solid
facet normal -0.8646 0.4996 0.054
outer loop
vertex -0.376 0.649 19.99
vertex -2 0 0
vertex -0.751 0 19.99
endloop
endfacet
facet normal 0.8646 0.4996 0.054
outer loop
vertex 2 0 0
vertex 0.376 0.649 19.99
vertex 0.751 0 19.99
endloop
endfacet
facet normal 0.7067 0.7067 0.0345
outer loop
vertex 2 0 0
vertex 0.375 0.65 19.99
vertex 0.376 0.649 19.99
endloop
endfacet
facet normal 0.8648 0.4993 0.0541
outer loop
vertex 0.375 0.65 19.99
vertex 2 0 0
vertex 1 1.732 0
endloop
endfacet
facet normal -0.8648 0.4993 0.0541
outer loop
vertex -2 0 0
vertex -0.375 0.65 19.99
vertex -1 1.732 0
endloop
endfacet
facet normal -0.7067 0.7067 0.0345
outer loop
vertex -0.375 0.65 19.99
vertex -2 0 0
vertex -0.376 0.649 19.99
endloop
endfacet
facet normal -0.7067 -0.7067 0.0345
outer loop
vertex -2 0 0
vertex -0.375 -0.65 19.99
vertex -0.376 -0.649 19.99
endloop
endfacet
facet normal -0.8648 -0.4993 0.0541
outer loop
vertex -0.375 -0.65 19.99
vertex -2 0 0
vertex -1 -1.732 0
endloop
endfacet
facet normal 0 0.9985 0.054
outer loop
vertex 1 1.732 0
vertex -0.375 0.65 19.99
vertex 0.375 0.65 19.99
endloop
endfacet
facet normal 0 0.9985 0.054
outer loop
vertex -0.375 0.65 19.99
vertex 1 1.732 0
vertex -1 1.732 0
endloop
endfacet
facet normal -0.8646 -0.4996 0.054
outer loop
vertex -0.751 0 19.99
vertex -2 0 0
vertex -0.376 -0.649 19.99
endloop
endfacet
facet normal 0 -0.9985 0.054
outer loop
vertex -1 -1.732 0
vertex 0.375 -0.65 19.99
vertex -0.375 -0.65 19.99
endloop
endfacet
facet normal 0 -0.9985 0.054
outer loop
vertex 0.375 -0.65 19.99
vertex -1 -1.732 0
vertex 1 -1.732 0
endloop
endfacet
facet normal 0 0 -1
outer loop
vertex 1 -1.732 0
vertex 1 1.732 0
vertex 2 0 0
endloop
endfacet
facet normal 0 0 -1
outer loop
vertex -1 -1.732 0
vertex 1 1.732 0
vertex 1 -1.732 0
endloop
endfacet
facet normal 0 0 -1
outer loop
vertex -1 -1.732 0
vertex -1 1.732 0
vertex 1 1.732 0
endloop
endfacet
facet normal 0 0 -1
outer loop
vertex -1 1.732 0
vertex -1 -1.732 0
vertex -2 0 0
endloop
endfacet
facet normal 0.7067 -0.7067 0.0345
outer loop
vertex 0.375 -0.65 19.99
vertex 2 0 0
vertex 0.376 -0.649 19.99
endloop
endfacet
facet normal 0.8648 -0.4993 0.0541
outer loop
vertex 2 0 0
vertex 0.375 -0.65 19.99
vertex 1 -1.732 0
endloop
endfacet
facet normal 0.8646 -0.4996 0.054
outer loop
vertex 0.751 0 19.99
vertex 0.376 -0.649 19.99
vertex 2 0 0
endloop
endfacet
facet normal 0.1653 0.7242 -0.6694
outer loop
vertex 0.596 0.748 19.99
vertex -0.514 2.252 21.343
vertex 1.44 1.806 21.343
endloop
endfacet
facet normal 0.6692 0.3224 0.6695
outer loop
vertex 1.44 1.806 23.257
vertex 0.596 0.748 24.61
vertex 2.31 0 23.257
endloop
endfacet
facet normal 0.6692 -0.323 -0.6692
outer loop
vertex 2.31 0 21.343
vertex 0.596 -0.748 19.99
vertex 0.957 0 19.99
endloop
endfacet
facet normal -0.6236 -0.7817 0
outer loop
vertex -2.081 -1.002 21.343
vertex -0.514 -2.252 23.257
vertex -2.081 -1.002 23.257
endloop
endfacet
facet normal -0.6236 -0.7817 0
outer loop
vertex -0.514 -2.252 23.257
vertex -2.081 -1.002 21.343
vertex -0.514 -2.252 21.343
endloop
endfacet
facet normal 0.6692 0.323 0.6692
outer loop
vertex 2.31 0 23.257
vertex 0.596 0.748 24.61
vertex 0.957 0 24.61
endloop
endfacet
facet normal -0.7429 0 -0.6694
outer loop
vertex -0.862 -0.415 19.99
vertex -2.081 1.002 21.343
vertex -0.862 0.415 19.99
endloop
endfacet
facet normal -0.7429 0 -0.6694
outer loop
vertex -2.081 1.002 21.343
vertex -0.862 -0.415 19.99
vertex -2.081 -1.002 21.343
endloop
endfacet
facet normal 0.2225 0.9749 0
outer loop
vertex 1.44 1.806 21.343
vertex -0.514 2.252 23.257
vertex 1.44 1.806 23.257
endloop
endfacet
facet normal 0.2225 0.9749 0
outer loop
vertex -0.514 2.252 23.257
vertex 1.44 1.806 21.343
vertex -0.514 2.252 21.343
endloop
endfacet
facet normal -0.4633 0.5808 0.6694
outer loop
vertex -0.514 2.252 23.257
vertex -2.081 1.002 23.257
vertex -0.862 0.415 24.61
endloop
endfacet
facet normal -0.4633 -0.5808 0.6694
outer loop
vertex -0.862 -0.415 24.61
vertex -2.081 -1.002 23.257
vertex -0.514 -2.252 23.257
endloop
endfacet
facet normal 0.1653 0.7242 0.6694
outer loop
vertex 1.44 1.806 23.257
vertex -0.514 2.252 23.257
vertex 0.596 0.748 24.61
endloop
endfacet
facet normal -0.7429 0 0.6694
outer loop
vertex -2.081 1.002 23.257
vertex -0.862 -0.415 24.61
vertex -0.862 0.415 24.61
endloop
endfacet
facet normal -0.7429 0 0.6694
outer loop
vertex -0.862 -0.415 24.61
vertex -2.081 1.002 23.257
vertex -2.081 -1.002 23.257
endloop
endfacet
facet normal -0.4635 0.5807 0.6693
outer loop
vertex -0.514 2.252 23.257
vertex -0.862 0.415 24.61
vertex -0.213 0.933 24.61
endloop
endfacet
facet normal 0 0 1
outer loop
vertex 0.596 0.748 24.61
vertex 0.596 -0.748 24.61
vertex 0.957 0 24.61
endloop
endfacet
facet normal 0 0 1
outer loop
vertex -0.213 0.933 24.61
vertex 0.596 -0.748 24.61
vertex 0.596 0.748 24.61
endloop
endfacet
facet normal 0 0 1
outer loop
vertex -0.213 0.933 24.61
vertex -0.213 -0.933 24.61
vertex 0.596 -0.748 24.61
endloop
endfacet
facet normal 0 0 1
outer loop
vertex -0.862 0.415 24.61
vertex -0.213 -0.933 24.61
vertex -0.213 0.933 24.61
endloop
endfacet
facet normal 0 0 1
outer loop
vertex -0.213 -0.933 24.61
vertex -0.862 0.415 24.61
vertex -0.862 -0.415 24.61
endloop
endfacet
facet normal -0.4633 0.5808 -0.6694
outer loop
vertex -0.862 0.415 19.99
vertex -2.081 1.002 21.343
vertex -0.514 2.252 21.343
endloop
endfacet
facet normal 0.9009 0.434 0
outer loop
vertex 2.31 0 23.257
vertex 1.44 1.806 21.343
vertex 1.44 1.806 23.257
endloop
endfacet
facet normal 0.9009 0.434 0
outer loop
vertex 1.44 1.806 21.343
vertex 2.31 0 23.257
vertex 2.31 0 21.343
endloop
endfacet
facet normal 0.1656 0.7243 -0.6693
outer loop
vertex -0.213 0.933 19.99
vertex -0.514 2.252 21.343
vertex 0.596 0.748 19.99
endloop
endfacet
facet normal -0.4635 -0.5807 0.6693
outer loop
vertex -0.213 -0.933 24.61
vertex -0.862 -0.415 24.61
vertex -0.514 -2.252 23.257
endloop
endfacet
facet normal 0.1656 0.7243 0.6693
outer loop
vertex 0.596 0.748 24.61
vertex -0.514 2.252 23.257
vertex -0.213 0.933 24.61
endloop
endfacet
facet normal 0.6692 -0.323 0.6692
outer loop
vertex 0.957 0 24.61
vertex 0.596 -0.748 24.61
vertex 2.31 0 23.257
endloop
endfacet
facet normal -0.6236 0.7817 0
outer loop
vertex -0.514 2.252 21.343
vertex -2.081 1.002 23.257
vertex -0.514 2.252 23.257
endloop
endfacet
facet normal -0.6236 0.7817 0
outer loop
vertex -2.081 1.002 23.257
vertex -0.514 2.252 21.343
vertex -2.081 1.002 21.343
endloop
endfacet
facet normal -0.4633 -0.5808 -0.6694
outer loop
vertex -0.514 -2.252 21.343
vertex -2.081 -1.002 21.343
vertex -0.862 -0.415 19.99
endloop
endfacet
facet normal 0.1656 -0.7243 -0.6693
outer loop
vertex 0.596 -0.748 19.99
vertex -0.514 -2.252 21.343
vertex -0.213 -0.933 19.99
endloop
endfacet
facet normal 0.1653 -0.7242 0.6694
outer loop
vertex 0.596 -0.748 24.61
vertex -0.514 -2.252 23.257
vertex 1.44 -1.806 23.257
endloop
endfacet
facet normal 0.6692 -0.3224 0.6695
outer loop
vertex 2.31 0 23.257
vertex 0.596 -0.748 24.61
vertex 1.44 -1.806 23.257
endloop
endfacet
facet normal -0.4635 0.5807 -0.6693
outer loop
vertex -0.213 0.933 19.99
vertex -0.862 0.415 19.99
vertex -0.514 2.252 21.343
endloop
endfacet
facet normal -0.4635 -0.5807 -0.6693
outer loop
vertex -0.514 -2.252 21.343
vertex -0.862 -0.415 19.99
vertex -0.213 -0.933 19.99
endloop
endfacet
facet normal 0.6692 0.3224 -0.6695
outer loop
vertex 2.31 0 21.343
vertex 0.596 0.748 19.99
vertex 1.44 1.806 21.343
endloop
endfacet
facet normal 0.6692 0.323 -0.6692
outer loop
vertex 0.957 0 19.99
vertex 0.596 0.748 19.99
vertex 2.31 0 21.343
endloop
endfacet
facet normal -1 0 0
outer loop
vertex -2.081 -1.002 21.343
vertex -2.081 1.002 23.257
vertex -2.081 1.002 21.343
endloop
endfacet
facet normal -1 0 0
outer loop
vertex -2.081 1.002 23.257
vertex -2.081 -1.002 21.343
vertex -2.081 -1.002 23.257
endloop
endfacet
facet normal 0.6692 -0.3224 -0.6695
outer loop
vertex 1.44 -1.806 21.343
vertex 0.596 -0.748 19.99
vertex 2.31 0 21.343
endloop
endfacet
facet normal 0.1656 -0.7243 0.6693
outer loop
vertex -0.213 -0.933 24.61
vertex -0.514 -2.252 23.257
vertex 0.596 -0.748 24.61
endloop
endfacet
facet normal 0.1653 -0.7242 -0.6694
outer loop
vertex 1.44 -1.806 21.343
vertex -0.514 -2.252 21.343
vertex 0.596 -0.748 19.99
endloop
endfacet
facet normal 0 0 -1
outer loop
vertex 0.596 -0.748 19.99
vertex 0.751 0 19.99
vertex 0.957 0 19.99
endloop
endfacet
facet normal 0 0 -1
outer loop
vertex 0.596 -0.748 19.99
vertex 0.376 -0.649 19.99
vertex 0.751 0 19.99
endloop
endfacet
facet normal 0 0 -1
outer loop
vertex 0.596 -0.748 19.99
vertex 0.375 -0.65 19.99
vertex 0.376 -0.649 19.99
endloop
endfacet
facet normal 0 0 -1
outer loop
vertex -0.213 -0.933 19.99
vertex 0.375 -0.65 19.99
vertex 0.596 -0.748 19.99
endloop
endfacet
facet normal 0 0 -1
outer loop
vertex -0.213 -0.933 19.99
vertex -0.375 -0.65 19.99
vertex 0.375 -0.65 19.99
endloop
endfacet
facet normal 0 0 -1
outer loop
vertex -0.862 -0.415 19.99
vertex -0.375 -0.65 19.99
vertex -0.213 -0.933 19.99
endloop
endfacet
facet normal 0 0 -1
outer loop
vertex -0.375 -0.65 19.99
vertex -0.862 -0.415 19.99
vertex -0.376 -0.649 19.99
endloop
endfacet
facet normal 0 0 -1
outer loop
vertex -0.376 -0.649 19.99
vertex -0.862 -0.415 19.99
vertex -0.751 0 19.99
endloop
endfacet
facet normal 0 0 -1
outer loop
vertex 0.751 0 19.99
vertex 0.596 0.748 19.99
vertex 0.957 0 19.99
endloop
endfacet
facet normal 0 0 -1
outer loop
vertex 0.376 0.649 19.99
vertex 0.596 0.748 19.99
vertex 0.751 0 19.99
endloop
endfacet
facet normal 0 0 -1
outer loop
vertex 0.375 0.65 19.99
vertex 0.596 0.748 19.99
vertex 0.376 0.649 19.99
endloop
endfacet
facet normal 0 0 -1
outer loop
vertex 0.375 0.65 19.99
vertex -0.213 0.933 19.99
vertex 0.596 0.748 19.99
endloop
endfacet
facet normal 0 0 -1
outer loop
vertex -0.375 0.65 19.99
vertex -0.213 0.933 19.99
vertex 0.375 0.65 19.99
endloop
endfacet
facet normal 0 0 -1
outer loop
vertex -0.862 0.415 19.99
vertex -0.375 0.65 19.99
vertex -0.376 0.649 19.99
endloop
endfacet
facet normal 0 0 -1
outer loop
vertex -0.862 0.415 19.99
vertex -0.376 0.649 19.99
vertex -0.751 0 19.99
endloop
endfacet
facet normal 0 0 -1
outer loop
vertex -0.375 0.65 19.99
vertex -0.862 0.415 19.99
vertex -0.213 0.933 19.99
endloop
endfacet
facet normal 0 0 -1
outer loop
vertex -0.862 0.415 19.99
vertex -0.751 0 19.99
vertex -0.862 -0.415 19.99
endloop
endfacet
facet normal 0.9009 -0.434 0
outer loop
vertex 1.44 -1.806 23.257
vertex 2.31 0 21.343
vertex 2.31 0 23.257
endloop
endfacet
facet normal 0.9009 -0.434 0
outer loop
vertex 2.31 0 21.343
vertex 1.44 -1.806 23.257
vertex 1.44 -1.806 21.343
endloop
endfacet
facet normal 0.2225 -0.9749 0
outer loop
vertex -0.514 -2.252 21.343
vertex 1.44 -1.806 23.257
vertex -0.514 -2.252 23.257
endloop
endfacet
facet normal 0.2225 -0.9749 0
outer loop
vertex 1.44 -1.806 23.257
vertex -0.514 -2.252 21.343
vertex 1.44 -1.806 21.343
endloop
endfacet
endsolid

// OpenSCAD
color("#A0A0A0") {
    cylinder(h=20, d1=4, d2=1.5, $fn=6);
}
color("#00FF00") {
    translate([0, 0, 22.3]) {
        sphere(d=5, $fn=7);
    }
}
